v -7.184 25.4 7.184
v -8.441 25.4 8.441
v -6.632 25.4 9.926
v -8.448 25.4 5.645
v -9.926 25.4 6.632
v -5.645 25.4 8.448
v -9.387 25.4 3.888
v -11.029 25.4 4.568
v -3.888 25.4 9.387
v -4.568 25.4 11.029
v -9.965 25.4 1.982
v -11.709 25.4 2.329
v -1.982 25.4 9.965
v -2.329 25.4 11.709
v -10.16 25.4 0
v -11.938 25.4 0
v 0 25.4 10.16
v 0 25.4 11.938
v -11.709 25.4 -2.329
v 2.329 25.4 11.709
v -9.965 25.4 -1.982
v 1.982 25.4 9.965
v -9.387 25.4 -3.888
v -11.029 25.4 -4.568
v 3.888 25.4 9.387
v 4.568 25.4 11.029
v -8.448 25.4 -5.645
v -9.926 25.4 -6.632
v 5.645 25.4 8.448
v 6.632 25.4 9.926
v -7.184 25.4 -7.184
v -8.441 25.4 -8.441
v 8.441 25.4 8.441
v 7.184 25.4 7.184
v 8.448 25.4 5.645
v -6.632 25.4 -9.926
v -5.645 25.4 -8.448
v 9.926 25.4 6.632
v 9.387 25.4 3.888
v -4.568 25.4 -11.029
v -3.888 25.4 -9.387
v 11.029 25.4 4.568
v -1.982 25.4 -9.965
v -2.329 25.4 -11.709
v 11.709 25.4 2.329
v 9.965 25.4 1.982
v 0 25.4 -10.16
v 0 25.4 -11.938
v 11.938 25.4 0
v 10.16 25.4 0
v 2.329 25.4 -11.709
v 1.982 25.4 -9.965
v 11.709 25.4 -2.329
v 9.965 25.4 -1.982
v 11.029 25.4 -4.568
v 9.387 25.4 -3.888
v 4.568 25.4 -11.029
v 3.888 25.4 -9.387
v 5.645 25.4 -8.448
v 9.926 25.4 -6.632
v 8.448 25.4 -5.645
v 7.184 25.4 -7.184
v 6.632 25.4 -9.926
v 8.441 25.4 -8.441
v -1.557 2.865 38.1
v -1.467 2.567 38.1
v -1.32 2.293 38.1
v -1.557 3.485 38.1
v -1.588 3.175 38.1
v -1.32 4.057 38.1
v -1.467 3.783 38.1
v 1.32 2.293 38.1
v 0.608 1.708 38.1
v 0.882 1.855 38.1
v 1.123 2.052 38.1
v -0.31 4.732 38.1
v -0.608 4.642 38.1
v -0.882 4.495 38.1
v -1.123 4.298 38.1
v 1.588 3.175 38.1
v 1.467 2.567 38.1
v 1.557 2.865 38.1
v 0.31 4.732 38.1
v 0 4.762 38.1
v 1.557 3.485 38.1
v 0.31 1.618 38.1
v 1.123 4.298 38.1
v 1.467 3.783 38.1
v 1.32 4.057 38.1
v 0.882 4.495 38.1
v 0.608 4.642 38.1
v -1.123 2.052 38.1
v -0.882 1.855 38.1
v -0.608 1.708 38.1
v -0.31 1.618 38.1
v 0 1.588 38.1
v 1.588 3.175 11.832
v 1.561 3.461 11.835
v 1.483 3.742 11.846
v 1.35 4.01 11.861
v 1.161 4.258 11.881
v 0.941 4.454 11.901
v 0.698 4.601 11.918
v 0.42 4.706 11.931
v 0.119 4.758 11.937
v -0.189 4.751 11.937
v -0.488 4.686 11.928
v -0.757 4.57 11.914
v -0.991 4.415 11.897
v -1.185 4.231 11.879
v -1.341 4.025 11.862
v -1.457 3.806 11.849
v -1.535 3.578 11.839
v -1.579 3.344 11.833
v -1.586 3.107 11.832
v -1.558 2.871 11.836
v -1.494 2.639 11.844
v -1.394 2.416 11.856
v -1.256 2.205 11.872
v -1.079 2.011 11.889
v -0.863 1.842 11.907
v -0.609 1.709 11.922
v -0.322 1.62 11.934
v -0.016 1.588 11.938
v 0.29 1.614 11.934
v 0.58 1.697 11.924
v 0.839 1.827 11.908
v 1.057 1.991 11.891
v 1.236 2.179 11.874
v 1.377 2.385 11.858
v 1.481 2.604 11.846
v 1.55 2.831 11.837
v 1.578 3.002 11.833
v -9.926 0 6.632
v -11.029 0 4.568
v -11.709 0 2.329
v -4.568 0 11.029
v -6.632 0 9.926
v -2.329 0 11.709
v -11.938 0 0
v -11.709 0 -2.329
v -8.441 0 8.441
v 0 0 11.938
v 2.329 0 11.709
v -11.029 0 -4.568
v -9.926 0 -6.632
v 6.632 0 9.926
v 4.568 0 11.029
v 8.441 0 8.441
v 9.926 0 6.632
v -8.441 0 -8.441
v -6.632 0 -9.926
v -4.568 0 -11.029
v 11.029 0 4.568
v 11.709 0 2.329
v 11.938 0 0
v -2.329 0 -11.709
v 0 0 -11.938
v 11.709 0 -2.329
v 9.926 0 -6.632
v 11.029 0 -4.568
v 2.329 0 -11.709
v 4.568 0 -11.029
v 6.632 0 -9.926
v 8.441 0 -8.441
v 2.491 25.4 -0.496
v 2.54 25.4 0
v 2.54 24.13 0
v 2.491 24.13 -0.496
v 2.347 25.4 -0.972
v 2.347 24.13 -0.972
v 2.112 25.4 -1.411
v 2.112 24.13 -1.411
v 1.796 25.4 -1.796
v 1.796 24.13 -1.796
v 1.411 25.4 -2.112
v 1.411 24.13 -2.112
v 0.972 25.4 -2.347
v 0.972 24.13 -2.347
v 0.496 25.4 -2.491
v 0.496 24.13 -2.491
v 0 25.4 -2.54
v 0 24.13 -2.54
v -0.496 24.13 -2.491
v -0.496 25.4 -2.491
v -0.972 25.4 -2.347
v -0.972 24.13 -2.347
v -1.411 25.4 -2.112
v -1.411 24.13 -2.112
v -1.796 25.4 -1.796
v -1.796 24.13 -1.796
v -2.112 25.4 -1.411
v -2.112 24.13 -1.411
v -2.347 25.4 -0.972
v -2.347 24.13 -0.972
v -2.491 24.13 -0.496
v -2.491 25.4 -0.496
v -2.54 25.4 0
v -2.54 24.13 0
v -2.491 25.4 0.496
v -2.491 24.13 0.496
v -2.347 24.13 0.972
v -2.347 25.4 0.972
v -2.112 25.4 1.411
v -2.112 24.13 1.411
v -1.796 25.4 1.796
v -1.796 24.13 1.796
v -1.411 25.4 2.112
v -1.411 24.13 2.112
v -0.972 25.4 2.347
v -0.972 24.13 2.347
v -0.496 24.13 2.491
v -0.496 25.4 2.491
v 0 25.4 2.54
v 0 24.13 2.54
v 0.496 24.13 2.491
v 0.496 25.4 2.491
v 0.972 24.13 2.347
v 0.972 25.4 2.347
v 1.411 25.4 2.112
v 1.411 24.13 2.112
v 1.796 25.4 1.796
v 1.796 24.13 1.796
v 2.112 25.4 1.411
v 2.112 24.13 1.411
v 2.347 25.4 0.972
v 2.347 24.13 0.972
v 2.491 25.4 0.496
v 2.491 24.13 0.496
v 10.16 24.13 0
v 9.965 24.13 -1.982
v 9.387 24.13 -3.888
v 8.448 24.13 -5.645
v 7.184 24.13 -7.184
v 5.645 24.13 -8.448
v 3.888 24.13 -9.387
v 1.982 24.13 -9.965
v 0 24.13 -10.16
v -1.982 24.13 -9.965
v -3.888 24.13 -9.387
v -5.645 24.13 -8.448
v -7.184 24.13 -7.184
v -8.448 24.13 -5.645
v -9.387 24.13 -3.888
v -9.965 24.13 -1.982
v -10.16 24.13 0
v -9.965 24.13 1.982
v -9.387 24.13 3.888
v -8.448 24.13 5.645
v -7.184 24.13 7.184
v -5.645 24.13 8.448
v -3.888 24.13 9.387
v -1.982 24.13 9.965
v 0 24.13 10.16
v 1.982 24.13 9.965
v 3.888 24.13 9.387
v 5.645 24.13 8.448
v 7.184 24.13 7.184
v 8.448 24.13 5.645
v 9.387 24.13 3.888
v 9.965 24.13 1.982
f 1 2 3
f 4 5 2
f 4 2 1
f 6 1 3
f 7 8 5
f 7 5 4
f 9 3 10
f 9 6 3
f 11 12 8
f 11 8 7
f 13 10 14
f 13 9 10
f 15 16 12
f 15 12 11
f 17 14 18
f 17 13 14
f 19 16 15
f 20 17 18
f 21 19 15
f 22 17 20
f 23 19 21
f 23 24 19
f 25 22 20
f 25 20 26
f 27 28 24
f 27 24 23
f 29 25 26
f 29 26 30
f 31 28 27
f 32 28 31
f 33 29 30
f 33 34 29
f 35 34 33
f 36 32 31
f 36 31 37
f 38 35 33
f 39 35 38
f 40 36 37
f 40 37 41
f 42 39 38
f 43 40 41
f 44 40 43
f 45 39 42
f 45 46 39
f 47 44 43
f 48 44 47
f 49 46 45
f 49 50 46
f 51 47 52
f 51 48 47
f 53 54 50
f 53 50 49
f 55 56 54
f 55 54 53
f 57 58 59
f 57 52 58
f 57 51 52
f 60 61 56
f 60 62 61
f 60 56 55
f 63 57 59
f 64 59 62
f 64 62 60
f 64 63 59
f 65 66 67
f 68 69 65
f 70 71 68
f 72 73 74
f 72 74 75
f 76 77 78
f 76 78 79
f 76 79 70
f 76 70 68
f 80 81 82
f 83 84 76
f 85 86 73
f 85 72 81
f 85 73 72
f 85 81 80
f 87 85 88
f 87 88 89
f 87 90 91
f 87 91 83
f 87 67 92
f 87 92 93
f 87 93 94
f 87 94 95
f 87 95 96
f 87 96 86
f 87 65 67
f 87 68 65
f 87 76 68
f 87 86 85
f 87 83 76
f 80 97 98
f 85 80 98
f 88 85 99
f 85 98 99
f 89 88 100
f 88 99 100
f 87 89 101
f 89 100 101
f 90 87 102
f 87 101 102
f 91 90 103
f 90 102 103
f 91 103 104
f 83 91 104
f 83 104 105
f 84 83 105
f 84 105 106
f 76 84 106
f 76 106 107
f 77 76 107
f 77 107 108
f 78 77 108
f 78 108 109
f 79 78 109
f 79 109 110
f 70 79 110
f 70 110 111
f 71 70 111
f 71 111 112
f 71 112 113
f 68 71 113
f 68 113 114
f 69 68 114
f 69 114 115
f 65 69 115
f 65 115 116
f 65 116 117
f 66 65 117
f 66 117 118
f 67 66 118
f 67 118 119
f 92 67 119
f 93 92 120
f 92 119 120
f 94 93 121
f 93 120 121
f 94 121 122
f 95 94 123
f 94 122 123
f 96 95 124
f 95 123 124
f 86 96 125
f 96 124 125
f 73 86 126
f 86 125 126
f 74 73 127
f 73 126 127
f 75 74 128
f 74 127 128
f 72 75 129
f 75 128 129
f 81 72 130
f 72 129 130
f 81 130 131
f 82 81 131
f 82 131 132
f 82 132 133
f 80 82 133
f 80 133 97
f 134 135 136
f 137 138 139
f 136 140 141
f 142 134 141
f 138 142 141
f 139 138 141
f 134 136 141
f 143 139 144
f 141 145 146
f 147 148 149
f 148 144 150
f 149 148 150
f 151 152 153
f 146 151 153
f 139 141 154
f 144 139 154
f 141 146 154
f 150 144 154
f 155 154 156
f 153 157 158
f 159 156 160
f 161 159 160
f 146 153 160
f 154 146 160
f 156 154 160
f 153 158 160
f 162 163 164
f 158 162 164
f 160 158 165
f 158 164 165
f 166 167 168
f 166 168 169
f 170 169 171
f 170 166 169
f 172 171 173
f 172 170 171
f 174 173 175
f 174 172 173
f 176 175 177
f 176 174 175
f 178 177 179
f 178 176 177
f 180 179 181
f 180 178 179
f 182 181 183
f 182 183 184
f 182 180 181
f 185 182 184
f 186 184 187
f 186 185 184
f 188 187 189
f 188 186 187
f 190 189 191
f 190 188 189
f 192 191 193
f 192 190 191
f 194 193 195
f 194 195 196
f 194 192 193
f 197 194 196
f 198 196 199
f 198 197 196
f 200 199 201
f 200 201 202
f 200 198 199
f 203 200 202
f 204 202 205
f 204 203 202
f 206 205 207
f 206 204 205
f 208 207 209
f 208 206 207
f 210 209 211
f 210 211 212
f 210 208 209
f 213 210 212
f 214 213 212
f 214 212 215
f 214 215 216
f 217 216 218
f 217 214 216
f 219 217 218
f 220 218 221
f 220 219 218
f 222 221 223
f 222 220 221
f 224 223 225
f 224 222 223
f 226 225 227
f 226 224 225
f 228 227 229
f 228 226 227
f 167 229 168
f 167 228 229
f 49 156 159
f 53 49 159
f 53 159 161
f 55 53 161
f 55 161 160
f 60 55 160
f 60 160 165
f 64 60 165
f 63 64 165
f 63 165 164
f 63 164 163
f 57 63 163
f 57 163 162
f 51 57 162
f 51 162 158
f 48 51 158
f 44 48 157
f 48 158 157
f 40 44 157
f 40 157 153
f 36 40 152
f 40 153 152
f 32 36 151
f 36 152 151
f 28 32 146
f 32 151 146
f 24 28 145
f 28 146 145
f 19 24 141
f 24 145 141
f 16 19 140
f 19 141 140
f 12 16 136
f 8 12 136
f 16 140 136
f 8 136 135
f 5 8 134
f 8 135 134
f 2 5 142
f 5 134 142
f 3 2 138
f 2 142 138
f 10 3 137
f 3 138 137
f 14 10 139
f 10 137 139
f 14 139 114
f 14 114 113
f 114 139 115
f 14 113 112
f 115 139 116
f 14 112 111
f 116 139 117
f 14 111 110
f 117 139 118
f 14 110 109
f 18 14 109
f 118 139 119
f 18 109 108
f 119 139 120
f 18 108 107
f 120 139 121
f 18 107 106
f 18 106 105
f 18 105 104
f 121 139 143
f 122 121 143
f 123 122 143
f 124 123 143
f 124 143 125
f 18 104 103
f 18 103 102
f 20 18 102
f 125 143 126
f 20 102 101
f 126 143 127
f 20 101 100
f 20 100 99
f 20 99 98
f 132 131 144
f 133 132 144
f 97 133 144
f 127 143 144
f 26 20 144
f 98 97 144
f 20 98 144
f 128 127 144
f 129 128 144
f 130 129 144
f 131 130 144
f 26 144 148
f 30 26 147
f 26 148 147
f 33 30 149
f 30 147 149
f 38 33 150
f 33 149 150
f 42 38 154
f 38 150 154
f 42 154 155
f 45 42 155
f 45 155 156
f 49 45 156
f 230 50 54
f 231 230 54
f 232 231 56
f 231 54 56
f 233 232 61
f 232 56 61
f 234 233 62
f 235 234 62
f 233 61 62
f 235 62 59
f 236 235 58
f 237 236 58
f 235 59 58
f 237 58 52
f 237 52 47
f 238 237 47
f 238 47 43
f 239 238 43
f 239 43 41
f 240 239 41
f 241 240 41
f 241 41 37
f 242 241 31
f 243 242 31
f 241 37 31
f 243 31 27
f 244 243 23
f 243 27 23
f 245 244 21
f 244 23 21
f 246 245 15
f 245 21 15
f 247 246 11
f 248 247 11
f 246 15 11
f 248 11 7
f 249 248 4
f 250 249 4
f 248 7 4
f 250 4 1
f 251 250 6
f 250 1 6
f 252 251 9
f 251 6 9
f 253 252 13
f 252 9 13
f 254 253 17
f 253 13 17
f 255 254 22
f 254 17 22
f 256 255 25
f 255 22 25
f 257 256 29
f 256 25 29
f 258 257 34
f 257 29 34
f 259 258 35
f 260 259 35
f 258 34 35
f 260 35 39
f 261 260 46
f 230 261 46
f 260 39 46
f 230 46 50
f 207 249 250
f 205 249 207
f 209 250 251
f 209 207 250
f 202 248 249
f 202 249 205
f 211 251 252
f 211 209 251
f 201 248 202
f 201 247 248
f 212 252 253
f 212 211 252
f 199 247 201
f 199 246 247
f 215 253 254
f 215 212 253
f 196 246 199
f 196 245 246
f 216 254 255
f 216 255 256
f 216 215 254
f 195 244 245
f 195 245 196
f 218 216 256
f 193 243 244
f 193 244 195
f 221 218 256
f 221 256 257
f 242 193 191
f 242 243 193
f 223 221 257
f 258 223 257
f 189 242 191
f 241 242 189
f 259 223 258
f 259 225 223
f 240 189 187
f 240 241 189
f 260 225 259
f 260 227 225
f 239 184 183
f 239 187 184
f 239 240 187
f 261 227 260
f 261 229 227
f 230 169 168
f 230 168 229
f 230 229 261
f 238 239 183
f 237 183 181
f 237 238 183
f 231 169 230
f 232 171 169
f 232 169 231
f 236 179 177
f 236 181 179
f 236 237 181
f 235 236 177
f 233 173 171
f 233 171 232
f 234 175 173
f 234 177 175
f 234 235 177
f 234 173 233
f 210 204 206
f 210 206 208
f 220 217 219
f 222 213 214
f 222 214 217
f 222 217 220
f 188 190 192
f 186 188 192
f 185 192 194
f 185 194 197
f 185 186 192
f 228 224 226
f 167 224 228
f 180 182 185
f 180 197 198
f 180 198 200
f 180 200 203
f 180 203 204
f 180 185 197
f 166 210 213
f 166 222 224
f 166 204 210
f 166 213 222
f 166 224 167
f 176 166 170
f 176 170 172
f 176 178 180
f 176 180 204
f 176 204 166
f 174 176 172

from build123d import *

# Parameters (mm, degrees)
SKETCH1_R           = 11.938
BOSS_EXTRUDE1_DEPTH = 25.4
SKETCH2_R           = 10.16
SKETCH2_R_2         = 2.54
CUT_EXTRUDE1_DEPTH  = 1.27
SKETCH3_R           = 1.5875
BOSS_EXTRUDE2_DEPTH = 38.1


with BuildPart() as part:
    # Sketch1 → Boss-Extrude1 (new body)
    with BuildSketch(Plane(origin=(0, 0, 0), x_dir=(1, 0, 0), z_dir=(0, 1, 0))):
        Circle(SKETCH1_R)
    extrude(amount=BOSS_EXTRUDE1_DEPTH)

    # Sketch2 → Cut-Extrude1 (cut)
    with BuildSketch(Plane(origin=(0, 25.4, 0), x_dir=(1, 0, 0), z_dir=(0, 1, 0))):
        Circle(SKETCH2_R)
        Circle(SKETCH2_R_2, mode=Mode.SUBTRACT)
    extrude(amount=-CUT_EXTRUDE1_DEPTH, mode=Mode.SUBTRACT)

    # Sketch3 → Boss-Extrude2 (add)
    with BuildSketch(Plane.XY):
        with Locations((0, 3.175)):
            Circle(SKETCH3_R)
    extrude(amount=BOSS_EXTRUDE2_DEPTH)


solid = part.part
